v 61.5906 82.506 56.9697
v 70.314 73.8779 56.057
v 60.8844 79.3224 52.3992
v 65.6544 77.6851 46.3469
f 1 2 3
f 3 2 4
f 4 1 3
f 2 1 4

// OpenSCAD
// Auto-generated auxetic polyhedron
points = [
    [60.884376, 79.322375, 52.399206],
    [70.313959, 73.877866, 56.056982],
    [61.590606, 82.506013, 56.969678],
    [65.654382, 77.685114, 46.346851],
];

faces = [
    [0, 1, 2],
    [3, 1, 0],
    [0, 2, 3],
    [3, 2, 1],
];

polyhedron(points = points, faces = faces);
